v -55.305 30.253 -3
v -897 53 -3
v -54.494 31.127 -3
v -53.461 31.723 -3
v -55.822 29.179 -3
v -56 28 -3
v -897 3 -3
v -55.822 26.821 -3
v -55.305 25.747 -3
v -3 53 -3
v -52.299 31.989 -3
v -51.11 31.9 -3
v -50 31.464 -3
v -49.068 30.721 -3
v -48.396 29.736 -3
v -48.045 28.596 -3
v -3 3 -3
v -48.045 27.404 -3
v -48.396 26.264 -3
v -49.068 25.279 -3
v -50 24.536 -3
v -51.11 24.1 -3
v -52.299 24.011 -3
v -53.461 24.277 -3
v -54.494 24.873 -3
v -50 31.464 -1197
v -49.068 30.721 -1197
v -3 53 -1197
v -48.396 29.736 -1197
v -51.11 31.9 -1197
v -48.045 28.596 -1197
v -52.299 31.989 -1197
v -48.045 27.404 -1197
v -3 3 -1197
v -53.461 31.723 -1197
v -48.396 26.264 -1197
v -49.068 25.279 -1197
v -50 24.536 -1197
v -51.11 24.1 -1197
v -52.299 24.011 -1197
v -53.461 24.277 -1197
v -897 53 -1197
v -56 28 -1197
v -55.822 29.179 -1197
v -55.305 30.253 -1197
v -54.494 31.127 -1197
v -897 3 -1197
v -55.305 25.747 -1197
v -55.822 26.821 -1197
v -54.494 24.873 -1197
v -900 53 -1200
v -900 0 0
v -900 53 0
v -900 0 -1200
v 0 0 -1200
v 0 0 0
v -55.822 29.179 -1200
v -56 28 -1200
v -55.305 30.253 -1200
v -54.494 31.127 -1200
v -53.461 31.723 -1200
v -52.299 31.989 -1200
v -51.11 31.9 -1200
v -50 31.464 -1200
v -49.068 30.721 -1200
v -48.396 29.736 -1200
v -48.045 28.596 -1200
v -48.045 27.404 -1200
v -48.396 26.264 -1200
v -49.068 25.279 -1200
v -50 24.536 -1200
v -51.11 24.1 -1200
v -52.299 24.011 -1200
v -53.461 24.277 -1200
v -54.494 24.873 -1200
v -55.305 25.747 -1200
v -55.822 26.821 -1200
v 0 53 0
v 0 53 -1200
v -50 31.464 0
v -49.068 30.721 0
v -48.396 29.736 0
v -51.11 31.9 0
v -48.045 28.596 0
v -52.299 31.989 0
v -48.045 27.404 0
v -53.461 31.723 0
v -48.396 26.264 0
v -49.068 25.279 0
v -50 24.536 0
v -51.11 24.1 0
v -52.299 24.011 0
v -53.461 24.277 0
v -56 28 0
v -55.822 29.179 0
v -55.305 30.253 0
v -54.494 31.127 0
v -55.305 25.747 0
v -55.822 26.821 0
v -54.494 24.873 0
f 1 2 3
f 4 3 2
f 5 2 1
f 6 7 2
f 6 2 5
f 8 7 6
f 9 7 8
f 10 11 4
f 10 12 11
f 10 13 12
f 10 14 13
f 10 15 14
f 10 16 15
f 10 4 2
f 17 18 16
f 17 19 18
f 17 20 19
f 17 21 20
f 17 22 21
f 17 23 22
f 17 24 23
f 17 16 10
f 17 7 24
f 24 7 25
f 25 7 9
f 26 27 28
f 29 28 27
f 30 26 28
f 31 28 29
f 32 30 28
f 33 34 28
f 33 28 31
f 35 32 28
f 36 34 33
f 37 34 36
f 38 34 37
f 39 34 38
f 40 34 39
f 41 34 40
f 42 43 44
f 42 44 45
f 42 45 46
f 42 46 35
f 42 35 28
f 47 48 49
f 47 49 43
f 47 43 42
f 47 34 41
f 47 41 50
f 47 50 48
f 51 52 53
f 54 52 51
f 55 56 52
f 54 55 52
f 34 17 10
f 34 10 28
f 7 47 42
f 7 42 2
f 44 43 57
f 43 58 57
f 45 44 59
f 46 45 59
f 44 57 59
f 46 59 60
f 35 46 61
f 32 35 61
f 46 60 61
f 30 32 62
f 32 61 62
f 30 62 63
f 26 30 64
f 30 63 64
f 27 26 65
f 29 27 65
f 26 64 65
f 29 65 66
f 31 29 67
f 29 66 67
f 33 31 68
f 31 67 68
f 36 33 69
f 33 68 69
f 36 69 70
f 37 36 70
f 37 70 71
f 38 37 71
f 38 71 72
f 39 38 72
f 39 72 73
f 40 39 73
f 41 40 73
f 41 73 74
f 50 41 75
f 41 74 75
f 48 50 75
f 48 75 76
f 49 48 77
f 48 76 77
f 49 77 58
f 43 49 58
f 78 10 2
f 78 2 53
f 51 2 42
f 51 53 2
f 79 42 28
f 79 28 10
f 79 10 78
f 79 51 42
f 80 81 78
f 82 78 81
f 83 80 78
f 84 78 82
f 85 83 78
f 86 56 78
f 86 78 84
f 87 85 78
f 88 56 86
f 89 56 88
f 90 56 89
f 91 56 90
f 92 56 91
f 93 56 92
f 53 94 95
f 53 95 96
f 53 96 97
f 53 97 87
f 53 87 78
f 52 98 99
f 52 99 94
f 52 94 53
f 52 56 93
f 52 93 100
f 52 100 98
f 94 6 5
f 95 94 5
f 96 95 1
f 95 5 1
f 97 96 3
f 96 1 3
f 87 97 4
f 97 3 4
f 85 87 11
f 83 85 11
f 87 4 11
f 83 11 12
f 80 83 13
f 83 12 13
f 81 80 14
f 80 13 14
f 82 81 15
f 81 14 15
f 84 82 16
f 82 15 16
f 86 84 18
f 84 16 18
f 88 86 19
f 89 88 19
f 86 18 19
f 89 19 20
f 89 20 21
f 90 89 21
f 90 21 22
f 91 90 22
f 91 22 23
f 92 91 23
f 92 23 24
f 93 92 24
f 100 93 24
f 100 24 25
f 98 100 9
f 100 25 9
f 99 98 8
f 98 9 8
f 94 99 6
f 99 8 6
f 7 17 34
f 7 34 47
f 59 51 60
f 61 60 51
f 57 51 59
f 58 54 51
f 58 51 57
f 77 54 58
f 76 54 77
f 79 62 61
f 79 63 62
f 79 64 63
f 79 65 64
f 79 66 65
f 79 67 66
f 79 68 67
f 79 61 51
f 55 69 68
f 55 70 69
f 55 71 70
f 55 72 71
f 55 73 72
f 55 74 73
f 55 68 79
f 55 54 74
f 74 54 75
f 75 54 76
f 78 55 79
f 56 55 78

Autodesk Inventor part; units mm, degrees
ref_plane "YZ Plane" through (0, 0, 0) normal (1, 0, 0) x (0, 1, 0)
ref_plane "XZ Plane" through (0, 0, 0) normal (0, 1, 0) x (-1, 0, 0)
ref_plane "XY Plane" through (0, 0, 0) normal (0, 0, 1) x (1, 0, 0)
sketch "Boceto1" plane through (0, 0, 0) normal (0, 1, 0) x (-1, 0, 0)
  line L0 (0, 0) -> (900, 0)
  line L1 (900, 0) -> (900, -1200)
  line L2 (900, -1200) -> (0, -1200)
  line L3 (0, -1200) -> (0, 0)
  dimension "d0" = 900
  dimension "d1" = 1200
extrude "Extrusión1" add sketch "Boceto1" along normal blind 3
sketch "Boceto2" plane through (0, 3, 0) normal (0, 1, 0) x (1, 0, 0)
  line L0 (0, 1200) -> (-900, 1200) projected
  line L1 (0, 0) -> (-900, 0)
  line L2 (-900, 0) -> (-900, 1200)
  line L3 (-900, 1200) -> (0, 1200)
  line L4 (0, 1200) -> (0, 0)
  line L5 (-897, 1197) -> (-897, 3)
  line L6 (-897, 3) -> (-3, 3)
  line L7 (-3, 3) -> (-3, 1197)
  line L8 (-3, 1197) -> (-897, 1197)
  dimension "d4" = 3
extrude "Extrusión2" add sketch "Boceto2" along normal blind 50
sketch "Boceto3" plane through (0, 0, -1200) normal (0, 0, -1) x (-1, 0, 0)
  circle A0 centre (52, 28) radius 4
  line L0 (0, 53) -> (900, 53) projected
  line L1 (0, 53) -> (-3, 53)
  line L2 (-3, 53) -> (-3, -10.4752)
  line L3 (-3, -10.4752) -> (0, -10.4752)
  line L4 (0, -10.4752) -> (0, 53)
  point P0 (0, 0)
  dimension "d7" = 8
  dimension "d8" = 25
  dimension "d9" = 3
  dimension "d10" = 55
extrude "Extrusión3" cut sketch "Boceto3" against normal blind 1243.5 contours A0
properties part number "tapa mesa"
